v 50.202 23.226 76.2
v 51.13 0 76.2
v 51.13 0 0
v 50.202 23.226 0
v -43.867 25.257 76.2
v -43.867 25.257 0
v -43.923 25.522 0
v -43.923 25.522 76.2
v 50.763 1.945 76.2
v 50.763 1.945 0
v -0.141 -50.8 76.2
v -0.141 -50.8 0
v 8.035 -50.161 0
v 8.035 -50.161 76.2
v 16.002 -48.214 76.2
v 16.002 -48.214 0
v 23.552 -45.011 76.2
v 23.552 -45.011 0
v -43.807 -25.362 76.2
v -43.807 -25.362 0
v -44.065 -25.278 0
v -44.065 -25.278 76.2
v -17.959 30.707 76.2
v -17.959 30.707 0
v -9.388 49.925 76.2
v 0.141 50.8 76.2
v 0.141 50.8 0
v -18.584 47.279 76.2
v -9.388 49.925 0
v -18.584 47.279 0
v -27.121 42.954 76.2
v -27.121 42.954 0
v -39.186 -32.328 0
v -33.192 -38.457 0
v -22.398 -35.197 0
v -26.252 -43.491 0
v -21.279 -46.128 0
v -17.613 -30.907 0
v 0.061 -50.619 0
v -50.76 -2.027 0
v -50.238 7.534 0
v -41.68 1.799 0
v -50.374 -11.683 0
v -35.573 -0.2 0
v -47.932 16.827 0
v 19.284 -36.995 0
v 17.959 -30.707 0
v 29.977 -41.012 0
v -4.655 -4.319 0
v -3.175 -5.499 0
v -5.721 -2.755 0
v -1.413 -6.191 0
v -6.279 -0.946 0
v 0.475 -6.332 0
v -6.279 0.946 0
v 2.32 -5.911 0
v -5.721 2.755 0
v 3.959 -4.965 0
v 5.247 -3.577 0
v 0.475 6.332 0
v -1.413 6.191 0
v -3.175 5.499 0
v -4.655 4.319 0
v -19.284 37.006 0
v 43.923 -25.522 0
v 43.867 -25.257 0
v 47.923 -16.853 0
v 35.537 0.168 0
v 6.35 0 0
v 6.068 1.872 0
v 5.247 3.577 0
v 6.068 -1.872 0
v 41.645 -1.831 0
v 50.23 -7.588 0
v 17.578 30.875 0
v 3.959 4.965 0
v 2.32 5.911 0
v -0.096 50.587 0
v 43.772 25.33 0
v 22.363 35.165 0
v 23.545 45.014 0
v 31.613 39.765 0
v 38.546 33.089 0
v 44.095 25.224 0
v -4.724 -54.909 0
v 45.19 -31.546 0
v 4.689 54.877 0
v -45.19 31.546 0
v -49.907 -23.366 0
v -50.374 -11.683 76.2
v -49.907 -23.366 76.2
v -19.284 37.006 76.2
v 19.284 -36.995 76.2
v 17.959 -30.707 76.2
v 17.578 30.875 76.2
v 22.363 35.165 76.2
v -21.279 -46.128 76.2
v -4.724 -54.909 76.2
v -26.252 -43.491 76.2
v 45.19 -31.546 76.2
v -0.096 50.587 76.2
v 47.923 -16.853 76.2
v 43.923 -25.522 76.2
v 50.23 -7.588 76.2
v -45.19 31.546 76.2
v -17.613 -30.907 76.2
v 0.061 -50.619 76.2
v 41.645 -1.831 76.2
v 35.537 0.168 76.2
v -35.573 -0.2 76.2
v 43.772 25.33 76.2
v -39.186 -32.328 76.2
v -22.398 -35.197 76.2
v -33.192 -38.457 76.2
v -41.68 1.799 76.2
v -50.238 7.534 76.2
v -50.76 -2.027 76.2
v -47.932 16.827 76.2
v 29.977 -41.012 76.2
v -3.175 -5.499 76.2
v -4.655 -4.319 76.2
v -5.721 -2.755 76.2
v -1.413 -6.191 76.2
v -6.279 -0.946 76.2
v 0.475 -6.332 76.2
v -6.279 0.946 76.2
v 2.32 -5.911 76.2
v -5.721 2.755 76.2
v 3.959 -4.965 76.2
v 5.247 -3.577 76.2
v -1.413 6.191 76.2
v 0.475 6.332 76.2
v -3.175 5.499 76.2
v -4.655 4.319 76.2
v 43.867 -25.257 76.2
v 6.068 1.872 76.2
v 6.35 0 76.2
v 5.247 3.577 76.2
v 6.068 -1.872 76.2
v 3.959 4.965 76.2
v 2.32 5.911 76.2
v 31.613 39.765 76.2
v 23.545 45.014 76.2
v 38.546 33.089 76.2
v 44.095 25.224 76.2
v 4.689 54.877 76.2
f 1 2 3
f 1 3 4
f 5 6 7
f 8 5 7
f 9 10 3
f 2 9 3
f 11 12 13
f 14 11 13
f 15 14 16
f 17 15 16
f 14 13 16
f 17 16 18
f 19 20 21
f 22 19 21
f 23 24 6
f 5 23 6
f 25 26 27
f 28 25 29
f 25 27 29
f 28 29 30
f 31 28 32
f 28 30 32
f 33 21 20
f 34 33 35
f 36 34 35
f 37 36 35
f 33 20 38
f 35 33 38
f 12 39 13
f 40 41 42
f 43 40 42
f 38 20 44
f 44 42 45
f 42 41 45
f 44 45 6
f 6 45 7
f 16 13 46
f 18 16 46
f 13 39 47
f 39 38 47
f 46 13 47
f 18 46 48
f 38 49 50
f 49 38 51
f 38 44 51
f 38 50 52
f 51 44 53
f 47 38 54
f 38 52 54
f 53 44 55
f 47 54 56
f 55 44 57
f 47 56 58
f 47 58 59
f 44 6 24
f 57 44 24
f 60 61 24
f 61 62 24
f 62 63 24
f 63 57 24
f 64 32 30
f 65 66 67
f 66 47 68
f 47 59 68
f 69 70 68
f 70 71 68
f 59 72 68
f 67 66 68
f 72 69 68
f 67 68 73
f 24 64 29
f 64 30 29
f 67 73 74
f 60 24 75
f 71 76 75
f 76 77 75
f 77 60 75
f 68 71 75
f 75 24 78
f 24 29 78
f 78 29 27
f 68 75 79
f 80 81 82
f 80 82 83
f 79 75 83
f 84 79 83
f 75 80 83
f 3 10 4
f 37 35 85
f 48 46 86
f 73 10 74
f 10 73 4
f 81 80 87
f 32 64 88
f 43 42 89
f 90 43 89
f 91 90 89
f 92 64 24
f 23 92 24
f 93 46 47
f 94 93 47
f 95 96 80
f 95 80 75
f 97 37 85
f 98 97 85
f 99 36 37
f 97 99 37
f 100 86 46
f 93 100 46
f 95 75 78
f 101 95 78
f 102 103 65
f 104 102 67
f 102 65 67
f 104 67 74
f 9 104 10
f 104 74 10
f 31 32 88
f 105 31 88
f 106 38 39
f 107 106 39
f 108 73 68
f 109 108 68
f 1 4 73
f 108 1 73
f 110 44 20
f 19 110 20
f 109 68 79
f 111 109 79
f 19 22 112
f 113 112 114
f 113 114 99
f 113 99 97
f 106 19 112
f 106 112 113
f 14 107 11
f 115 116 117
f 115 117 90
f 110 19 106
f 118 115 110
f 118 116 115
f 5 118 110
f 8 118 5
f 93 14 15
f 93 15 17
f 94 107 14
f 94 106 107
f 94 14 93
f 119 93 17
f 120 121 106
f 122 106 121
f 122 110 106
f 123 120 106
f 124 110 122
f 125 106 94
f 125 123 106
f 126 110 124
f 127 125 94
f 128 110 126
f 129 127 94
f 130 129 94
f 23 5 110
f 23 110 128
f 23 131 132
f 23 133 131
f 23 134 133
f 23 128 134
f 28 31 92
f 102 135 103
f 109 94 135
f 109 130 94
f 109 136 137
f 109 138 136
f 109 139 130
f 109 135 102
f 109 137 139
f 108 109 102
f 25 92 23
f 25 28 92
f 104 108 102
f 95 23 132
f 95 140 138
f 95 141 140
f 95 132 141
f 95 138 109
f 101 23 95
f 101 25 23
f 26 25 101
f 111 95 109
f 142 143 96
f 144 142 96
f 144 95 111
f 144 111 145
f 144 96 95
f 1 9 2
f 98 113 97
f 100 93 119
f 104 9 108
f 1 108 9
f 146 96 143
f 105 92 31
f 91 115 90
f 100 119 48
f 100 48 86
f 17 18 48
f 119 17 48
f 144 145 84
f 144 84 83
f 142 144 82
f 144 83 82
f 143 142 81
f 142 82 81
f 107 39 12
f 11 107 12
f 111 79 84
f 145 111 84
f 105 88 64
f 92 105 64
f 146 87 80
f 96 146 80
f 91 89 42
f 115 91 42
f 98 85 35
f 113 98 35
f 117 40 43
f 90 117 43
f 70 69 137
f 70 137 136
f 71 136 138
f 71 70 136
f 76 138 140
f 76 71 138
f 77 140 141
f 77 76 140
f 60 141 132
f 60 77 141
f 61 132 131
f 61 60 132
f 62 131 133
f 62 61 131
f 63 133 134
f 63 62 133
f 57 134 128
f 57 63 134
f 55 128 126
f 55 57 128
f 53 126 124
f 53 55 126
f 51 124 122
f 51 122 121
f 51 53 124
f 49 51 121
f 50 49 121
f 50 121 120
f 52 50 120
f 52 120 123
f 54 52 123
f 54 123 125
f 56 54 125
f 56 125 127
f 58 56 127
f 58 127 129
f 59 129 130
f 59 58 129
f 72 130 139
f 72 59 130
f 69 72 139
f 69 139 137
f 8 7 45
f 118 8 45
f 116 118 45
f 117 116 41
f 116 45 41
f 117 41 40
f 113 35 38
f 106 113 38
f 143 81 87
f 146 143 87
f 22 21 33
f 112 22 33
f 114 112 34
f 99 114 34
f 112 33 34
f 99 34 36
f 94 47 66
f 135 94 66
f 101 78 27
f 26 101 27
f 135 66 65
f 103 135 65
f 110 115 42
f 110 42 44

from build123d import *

# Parameters (mm, degrees)
F0_R     = 6.35
F1_DEPTH = 76.2


with BuildPart() as f1:
    # F0 (on Top) → F1 (new body)
    with BuildSketch(Plane.XY):
        with BuildLine():
            Line((-43.806983, -25.361842), (-44.06456, -25.27755))
            ThreePointArc((-44.06456, -25.27755), (-36.318587, -35.519013), (-26.252069, -43.49102))
            Line((-26.252069, -43.49102), (-21.279346, -46.128401))
            Line((-21.279346, -46.128401), (-4.724133, -54.908783))
            Line((-4.724133, -54.908783), (-22.398102, -35.196542))
            Line((-22.398102, -35.196542), (-17.613461, -30.90664))
            Line((-17.613461, -30.90664), (0.060508, -50.618881))
            Line((0.060508, -50.618881), (-0.14128, -50.799804))
            ThreePointArc((-0.14128, -50.799804), (12.057786, -49.34825), (23.551673, -45.010651))
            Line((23.551673, -45.010651), (29.977489, -41.012073))
            Line((29.977489, -41.012073), (45.190335, -31.545611))
            Line((45.190335, -31.545611), (19.28448, -36.995084))
            Line((19.28448, -36.995084), (17.959204, -30.707025))
            Line((17.959204, -30.707025), (43.867491, -25.257039))
            Line((43.867491, -25.257039), (43.92328, -25.522254))
            ThreePointArc((43.92328, -25.522254), (49.294753, -12.274661), (50.762755, 1.944916))
            Line((50.762755, 1.944916), (51.130101, 0))
            Line((51.130101, 0), (50.202441, 23.225819))
            Line((50.202441, 23.225819), (41.644922, -1.83064))
            Line((41.644922, -1.83064), (35.537437, 0.168029))
            Line((35.537437, 0.168029), (43.771755, 25.330256))
            Line((43.771755, 25.330256), (44.094956, 25.224489))
            ThreePointArc((44.094956, 25.224489), (35.237916, 36.591383), (23.545425, 45.01392))
            Line((23.545425, 45.01392), (4.688904, 54.877198))
            Line((4.688904, 54.877198), (22.362902, 35.164925))
            Line((22.362902, 35.164925), (17.578261, 30.875022))
            Line((17.578261, 30.875022), (-0.095736, 50.587295))
            Line((-0.095736, 50.587295), (0.14128, 50.799804))
            ThreePointArc((0.14128, 50.799804), (-14.048748, 48.818774), (-27.121244, 42.954373))
            Line((-27.121244, 42.954373), (-45.190335, 31.545611))
            Line((-45.190335, 31.545611), (-19.284156, 37.005613))
            Line((-19.284156, 37.005613), (-17.959204, 30.707025))
            Line((-17.959204, 30.707025), (-43.867491, 25.257039))
            Line((-43.867491, 25.257039), (-43.92328, 25.522254))
            ThreePointArc((-43.92328, 25.522254), (-49.304707, 12.234617), (-50.759528, -2.02738))
            Line((-50.759528, -2.02738), (-50.373884, -11.682765))
            Line((-50.373884, -11.682765), (-49.907264, -23.36553))
            Line((-49.907264, -23.36553), (-41.68015, 1.799054))
            Line((-41.68015, 1.799054), (-35.572666, -0.199615))
            Line((-35.572666, -0.199615), (-43.806983, -25.361842))
        make_face()
        Circle(F0_R, mode=Mode.SUBTRACT)
    extrude(amount=F1_DEPTH)


solid = f1.part
